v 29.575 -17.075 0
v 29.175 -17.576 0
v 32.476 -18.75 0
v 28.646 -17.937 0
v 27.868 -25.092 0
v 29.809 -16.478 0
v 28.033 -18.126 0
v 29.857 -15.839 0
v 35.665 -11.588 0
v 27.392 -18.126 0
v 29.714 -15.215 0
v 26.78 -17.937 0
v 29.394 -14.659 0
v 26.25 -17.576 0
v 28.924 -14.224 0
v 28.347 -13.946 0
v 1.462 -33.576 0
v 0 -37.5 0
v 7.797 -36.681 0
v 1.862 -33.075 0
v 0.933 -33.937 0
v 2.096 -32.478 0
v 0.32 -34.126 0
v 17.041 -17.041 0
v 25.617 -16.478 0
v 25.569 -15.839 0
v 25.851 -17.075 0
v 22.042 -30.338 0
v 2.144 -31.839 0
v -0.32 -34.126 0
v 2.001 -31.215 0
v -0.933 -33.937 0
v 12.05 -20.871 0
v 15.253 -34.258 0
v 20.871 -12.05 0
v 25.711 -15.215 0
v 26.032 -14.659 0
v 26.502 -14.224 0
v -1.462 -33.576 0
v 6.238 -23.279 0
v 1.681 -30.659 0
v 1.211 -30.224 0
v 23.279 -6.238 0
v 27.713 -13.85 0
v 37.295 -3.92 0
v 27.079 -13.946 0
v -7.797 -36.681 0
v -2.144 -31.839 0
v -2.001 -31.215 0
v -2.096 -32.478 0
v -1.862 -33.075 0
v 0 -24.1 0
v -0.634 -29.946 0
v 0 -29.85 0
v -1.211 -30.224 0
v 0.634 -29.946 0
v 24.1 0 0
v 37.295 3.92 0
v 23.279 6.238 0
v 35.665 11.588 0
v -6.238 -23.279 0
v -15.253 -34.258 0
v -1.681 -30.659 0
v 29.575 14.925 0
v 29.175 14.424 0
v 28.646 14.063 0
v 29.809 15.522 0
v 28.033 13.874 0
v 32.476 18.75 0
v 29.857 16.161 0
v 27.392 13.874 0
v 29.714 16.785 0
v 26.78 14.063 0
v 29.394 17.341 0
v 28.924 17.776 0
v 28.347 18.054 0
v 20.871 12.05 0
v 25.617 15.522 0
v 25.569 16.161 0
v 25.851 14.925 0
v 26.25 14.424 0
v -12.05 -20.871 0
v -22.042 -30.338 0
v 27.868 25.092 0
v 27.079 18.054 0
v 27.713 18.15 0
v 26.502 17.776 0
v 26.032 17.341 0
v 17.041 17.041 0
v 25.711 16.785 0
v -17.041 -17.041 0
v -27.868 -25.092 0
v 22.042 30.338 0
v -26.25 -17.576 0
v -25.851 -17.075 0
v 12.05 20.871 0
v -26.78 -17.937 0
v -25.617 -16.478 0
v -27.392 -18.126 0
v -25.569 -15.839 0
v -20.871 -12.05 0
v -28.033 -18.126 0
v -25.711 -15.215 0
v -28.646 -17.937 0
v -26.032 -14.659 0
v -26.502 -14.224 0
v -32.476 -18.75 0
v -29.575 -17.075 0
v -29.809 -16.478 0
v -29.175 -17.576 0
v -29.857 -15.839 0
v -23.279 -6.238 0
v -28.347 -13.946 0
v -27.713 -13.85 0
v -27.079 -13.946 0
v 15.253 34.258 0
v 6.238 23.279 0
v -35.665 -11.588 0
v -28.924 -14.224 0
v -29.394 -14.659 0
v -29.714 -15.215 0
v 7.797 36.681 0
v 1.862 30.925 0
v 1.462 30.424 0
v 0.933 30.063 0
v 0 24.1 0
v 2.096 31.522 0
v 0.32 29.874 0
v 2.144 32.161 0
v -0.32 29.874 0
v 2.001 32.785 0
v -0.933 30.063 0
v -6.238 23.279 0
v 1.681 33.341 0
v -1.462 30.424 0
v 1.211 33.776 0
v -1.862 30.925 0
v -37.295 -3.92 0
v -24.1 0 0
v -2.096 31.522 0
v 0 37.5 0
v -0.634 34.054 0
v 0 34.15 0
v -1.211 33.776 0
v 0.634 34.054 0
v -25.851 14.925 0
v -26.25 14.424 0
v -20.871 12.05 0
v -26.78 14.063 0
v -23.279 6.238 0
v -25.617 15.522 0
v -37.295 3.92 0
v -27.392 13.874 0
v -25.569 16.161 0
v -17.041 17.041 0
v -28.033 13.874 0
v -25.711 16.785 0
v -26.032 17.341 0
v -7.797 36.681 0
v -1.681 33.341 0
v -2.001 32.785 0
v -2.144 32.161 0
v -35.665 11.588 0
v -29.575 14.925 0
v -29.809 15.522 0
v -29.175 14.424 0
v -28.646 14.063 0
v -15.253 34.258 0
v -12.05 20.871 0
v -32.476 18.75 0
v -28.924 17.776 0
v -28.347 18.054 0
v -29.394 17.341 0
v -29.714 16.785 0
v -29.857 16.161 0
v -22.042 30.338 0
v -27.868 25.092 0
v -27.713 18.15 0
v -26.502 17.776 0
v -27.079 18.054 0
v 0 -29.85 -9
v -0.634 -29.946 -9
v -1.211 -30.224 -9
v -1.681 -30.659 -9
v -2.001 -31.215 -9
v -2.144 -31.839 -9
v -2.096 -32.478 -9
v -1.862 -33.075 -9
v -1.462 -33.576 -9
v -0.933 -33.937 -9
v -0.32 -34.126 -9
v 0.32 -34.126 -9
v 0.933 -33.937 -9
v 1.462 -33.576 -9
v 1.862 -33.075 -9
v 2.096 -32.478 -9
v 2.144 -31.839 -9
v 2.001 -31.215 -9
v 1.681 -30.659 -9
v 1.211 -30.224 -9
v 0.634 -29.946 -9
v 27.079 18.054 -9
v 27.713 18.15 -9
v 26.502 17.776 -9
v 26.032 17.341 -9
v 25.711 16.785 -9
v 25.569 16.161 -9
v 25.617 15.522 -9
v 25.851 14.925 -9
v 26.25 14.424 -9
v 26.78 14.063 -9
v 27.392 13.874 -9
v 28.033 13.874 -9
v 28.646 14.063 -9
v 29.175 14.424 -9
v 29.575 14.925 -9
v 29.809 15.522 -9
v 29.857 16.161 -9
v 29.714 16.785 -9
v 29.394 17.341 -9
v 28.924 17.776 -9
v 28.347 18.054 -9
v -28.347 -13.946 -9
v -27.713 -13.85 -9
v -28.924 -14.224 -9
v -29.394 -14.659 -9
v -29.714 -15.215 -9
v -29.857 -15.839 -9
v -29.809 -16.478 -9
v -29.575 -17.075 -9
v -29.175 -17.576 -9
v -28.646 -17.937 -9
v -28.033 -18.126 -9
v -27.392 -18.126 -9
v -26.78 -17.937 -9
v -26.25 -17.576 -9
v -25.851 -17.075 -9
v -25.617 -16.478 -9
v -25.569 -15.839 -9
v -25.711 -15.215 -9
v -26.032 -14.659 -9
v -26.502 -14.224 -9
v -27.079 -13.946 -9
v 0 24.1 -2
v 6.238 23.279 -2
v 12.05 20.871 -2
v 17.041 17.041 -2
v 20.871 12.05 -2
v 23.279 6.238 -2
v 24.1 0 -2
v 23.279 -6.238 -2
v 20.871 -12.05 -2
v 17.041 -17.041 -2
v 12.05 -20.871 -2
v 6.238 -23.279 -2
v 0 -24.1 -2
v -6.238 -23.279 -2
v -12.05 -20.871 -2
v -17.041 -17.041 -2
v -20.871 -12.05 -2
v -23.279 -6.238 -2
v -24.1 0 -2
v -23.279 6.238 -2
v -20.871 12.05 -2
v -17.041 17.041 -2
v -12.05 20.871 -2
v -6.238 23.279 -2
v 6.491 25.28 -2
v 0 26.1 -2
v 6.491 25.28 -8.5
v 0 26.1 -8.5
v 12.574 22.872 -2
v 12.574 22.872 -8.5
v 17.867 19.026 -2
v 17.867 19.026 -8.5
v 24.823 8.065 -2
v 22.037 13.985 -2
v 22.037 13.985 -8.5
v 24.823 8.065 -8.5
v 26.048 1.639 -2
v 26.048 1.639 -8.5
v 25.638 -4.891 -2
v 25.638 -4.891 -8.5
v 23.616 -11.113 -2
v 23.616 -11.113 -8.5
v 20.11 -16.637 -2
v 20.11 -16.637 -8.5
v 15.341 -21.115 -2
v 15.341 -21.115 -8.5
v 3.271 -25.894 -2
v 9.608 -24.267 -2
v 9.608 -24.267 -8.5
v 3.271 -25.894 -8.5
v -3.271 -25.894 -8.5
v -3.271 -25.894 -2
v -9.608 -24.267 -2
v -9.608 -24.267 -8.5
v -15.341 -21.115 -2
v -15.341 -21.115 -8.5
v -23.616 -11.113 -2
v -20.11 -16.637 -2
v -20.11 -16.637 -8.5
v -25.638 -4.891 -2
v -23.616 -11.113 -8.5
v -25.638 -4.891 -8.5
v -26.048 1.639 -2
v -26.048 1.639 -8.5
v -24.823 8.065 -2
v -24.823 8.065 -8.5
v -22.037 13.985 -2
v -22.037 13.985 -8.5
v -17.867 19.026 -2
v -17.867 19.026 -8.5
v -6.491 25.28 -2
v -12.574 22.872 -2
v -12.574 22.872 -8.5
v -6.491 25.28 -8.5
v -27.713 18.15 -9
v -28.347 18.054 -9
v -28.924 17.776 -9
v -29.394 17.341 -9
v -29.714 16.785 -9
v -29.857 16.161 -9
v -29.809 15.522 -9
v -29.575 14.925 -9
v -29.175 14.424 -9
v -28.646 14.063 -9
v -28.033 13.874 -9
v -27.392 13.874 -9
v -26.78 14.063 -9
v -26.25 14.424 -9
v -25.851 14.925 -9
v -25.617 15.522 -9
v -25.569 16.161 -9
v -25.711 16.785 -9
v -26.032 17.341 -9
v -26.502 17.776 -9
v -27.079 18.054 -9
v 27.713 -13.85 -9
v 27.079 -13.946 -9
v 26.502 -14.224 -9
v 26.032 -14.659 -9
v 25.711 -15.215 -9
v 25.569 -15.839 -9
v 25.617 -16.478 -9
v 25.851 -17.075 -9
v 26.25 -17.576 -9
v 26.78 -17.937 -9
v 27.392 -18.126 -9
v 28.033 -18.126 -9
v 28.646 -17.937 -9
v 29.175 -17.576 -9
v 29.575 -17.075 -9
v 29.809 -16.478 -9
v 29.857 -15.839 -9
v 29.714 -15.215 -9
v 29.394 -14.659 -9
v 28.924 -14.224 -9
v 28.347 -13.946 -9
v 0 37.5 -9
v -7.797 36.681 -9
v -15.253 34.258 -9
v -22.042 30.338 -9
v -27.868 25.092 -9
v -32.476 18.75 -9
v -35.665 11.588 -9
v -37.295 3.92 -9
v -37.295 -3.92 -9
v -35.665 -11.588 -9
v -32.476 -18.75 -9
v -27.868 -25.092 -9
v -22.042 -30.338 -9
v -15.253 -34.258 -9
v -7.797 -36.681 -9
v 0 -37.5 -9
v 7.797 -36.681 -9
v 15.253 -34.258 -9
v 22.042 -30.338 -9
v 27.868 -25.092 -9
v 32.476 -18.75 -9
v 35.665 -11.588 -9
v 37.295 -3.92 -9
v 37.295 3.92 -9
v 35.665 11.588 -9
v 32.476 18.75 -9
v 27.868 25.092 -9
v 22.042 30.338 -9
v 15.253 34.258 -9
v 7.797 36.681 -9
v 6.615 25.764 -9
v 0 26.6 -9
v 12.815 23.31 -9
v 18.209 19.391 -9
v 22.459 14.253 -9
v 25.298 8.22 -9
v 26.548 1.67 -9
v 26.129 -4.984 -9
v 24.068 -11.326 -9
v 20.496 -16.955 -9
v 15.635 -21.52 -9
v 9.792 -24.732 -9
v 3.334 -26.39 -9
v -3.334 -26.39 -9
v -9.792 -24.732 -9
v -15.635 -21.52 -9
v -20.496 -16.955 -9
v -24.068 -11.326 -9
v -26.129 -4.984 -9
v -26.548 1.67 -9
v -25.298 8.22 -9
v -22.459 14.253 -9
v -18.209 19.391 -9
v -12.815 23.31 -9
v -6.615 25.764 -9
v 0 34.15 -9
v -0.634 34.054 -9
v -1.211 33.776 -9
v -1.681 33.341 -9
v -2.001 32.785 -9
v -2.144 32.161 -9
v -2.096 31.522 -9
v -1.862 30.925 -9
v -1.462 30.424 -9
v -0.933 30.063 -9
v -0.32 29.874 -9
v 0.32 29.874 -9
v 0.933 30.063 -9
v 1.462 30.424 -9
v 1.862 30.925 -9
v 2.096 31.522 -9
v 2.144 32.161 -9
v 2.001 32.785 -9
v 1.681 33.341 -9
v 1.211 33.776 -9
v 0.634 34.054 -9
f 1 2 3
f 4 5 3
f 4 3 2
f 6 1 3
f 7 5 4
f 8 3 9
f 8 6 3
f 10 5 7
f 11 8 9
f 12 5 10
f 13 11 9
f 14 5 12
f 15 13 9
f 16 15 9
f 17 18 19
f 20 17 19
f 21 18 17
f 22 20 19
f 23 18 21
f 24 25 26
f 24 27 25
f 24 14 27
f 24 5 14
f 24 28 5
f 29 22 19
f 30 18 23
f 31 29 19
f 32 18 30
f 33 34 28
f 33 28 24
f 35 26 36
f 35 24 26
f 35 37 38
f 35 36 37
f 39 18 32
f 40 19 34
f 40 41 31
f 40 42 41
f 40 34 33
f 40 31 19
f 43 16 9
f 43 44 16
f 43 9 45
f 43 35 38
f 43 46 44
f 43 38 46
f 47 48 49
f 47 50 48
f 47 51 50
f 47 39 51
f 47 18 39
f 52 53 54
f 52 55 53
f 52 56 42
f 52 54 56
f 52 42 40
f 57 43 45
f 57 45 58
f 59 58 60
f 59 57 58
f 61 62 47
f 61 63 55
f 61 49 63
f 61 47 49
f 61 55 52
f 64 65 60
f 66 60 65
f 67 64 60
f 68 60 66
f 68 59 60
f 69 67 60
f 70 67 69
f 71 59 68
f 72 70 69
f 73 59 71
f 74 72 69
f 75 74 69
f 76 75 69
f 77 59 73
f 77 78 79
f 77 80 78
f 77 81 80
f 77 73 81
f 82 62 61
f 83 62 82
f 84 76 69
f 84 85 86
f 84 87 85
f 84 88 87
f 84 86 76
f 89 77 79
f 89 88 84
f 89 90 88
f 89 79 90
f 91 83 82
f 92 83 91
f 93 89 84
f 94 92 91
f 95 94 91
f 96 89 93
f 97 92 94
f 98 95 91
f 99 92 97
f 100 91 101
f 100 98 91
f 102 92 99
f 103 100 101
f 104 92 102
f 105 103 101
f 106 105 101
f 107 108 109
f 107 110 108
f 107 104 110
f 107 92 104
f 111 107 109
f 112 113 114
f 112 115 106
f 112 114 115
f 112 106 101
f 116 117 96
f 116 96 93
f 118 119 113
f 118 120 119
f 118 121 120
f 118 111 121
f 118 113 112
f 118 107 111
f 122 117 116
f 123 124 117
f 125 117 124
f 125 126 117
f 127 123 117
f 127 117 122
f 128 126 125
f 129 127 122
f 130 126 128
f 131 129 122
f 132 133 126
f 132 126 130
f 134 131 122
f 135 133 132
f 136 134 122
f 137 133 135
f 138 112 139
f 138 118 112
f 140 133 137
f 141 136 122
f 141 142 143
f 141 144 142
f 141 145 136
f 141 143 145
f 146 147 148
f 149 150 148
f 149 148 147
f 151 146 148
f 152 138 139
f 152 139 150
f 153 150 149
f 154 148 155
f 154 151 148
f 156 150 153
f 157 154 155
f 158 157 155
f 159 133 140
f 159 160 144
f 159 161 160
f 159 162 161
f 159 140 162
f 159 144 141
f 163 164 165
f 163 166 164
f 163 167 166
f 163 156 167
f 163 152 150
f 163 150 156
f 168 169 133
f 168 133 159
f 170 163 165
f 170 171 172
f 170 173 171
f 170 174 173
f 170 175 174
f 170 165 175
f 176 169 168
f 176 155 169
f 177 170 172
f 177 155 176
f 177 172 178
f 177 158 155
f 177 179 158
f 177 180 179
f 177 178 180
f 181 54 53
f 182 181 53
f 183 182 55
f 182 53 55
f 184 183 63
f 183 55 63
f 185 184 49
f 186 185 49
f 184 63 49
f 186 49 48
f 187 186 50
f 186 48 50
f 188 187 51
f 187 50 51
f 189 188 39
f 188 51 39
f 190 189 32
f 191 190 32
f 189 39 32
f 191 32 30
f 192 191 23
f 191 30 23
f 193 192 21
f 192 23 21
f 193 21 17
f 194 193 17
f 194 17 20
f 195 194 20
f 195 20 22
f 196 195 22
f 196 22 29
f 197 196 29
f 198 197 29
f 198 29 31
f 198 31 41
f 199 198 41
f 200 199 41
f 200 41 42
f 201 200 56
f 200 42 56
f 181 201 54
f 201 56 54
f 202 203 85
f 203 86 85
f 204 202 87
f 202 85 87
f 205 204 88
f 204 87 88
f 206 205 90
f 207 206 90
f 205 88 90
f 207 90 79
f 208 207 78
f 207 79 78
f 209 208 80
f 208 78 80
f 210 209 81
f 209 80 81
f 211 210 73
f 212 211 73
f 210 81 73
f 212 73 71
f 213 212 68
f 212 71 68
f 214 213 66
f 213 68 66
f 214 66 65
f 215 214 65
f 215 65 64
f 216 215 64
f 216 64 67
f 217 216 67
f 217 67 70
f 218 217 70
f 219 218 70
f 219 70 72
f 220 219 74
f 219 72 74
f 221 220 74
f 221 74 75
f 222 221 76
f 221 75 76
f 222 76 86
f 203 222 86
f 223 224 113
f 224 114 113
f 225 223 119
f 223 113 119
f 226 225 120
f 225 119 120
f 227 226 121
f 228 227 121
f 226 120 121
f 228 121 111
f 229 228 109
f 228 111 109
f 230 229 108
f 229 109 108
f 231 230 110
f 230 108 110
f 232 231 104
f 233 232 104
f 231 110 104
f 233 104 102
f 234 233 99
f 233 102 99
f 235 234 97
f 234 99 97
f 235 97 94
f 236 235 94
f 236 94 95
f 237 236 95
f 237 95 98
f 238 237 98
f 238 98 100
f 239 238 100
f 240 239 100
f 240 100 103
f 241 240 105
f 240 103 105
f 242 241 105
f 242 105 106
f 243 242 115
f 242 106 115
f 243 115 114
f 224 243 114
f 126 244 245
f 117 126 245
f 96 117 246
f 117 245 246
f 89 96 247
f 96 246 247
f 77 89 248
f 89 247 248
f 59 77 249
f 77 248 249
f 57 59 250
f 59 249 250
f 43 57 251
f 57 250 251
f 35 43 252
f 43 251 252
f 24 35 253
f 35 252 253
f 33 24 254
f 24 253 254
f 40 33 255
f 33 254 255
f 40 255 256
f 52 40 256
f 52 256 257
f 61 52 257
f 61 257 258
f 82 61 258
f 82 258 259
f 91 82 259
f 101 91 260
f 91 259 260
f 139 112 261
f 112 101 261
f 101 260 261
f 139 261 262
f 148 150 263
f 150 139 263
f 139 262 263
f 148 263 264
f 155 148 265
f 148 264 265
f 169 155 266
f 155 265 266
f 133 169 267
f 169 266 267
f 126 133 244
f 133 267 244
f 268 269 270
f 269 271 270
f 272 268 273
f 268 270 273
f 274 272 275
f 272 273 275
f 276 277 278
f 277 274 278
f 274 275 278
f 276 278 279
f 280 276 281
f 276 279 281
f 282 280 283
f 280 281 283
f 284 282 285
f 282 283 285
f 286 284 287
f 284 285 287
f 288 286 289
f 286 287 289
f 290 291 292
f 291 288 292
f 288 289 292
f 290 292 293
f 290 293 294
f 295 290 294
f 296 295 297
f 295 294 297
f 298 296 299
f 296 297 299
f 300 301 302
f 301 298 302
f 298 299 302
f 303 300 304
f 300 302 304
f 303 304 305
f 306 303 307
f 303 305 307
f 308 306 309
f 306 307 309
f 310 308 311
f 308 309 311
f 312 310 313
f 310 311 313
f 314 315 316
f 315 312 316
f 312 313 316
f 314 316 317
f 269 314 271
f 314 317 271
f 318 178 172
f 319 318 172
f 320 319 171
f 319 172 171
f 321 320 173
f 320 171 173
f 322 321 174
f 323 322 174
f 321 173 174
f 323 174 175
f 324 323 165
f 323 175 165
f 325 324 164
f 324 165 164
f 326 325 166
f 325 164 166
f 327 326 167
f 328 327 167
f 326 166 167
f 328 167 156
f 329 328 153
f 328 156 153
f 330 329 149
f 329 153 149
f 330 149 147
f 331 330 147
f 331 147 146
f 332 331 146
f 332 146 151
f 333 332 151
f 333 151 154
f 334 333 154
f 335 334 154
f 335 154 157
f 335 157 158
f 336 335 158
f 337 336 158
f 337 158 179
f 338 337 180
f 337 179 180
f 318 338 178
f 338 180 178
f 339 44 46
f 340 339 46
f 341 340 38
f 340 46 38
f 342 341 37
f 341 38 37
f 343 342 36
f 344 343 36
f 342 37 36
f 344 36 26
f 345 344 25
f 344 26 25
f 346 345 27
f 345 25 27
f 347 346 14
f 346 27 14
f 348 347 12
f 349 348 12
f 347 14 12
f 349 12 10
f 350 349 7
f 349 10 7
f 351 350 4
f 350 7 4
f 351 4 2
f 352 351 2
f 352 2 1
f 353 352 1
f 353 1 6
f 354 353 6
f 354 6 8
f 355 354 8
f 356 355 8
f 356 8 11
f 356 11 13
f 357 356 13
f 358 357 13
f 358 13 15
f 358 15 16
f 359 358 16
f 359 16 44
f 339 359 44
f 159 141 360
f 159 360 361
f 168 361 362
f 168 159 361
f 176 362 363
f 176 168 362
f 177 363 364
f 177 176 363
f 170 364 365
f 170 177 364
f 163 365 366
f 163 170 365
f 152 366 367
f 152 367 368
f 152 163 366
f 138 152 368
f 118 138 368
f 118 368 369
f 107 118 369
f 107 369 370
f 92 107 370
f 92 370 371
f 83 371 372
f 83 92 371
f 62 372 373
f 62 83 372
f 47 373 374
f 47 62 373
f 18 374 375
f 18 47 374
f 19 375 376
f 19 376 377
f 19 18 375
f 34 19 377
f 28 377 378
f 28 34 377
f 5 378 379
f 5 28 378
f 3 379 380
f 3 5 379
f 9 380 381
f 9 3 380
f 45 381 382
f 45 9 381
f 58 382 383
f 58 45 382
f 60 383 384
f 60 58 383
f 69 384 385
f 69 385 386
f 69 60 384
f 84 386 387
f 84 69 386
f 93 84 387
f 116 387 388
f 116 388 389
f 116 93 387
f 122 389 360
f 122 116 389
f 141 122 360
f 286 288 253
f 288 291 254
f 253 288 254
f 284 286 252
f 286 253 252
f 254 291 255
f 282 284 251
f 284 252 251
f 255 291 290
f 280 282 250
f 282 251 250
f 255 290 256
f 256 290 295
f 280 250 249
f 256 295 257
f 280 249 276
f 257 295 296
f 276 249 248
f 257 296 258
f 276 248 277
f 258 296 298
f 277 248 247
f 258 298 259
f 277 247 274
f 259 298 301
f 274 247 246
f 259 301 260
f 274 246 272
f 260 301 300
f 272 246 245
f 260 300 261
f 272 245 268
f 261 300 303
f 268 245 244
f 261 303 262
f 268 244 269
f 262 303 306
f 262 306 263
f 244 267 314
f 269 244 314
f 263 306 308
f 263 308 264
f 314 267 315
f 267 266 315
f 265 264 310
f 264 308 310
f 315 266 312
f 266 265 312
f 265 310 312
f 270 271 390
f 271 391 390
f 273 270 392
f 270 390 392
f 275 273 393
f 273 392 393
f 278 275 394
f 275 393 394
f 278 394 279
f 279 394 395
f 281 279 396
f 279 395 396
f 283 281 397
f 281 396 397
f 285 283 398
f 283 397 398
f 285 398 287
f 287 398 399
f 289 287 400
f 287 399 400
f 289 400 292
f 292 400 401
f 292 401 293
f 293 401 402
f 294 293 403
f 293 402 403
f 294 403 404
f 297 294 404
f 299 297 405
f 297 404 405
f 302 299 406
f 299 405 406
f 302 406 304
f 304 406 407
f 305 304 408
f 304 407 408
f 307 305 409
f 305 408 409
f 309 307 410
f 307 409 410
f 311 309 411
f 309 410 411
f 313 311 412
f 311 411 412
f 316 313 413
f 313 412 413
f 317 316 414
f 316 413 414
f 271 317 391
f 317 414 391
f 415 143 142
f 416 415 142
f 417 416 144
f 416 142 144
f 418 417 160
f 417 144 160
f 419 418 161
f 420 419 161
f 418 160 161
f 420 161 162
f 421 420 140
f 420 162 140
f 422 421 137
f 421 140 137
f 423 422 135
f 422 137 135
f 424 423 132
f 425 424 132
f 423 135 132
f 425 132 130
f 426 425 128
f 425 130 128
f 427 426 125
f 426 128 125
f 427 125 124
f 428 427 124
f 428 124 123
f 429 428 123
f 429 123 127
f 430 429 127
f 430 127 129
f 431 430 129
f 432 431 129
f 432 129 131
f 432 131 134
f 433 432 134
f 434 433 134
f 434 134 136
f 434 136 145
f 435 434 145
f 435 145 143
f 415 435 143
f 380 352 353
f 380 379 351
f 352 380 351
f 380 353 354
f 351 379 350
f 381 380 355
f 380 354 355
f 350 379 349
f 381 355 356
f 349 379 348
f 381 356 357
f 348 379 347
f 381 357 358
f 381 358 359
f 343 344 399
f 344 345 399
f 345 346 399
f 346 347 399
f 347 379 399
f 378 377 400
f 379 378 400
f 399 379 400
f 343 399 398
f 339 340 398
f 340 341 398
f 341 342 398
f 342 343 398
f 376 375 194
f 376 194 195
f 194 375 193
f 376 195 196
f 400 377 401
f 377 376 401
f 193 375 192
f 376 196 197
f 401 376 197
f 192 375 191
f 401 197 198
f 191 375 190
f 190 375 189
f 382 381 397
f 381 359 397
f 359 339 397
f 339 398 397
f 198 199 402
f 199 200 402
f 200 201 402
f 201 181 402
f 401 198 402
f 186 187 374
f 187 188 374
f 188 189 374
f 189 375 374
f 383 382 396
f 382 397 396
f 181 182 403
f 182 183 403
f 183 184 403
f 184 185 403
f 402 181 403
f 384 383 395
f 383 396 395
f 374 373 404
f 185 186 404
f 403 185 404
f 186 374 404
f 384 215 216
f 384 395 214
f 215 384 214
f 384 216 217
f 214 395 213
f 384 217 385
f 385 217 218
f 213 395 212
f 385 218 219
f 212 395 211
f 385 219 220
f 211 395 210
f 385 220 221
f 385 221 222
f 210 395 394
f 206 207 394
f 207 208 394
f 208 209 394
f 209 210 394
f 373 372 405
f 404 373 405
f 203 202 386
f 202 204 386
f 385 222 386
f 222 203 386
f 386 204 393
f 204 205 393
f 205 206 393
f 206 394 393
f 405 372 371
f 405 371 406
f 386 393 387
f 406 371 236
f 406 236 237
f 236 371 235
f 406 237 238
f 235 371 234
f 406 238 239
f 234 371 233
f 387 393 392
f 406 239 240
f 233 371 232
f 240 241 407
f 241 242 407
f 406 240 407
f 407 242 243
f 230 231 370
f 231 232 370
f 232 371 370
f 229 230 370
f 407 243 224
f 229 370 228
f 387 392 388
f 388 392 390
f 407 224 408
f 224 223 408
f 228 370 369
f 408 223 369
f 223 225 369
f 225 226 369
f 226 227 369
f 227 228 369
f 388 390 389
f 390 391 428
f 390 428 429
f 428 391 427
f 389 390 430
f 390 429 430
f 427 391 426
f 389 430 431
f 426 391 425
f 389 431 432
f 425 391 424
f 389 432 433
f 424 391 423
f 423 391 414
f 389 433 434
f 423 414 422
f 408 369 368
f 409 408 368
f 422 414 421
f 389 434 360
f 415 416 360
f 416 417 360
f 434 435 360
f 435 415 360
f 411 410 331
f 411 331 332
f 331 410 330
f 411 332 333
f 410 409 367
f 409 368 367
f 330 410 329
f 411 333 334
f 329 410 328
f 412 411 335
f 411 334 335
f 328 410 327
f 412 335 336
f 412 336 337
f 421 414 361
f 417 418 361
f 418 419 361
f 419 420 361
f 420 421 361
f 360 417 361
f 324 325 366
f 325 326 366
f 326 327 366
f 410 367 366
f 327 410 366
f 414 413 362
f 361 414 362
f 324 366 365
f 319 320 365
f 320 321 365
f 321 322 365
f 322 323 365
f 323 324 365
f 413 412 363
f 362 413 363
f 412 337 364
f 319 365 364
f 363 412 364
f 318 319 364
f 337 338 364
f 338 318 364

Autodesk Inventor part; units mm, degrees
ref_plane "YZ Plane" through (0, 0, 0) normal (1, 0, 0) x (0, 1, 0)
ref_plane "XZ Plane" through (0, 0, 0) normal (0, 1, 0) x (-1, 0, 0)
ref_plane "XY Plane" through (0, 0, 0) normal (0, 0, 1) x (1, 0, 0)
sketch "スケッチ1" plane through (0, 0, 0) normal (1, 0, 0) x (0, 1, 0)
  line L0 (24.1, 0) -> (24.1, -2)
  line L1 (24.1, -2) -> (26.1, -2)
  line L2 (26.1, -2) -> (26.1, -9)
  line L3 (26.1, -9) -> (37.5, -9)
  line L4 (37.5, -9) -> (37.5, 0)
  line L5 (37.5, 0) -> (24.1, 0)
  line L6 (0, -10.8) -> (0, 1.8) projected
  point P0 (0, 0)
  dimension "d0" = 26.1
  dimension "d1" = 37.5
  dimension "d2" = 7
  dimension "d3" = 2
  dimension "d4" = 2
revolve "回転1" add sketch "スケッチ1" angle 360 about axis through (0, 0, -10) along (0, 0, 1)
sketch "スケッチ2" plane through (0, 0, -9) normal (0, 0, -1) x (-1, 0, 0)
  circle A0 centre (0, 0) radius 32
  point P0 (0, 32)
  point P1 (-27.7128, 16)
  point P2 (-27.7128, -16)
  point P3 (0, -32)
  point P4 (27.7128, -16)
  point P5 (27.7128, 16)
  dimension "d6" = 64
  dimension "d9" = 360
hole "穴1" at (0, 32, -9) at (27.7128, 16, -9) at (27.7128, -16, -9) at (0, -32, -9) at (-27.7128, -16, -9) at (-27.7128, 16, -9) direction (0, 0, 1) diameter 4.3 end through all clearance for "Socket Head Cap Screw" size "M4" standard "Ansi Metric M Profile"
chamfer "面取り1" distance 0.5 angle 45 1 edges at (0, -26.1, -9)
sketch "スケッチ3" plane through (0, 0, -9) normal (0, 0, -1) x (-1, 0, 0)
  circle A0 centre (-37.5, 0) radius 4.8
  circle A1 centre (0, 0) radius 37.5 projected
  point P0 (-37.1928, 4.7902)
  point P1 (-37.1928, -4.7902)
  dimension "d18" = 9.6
properties part number "unit-base1" material "ABS プラスチック"
